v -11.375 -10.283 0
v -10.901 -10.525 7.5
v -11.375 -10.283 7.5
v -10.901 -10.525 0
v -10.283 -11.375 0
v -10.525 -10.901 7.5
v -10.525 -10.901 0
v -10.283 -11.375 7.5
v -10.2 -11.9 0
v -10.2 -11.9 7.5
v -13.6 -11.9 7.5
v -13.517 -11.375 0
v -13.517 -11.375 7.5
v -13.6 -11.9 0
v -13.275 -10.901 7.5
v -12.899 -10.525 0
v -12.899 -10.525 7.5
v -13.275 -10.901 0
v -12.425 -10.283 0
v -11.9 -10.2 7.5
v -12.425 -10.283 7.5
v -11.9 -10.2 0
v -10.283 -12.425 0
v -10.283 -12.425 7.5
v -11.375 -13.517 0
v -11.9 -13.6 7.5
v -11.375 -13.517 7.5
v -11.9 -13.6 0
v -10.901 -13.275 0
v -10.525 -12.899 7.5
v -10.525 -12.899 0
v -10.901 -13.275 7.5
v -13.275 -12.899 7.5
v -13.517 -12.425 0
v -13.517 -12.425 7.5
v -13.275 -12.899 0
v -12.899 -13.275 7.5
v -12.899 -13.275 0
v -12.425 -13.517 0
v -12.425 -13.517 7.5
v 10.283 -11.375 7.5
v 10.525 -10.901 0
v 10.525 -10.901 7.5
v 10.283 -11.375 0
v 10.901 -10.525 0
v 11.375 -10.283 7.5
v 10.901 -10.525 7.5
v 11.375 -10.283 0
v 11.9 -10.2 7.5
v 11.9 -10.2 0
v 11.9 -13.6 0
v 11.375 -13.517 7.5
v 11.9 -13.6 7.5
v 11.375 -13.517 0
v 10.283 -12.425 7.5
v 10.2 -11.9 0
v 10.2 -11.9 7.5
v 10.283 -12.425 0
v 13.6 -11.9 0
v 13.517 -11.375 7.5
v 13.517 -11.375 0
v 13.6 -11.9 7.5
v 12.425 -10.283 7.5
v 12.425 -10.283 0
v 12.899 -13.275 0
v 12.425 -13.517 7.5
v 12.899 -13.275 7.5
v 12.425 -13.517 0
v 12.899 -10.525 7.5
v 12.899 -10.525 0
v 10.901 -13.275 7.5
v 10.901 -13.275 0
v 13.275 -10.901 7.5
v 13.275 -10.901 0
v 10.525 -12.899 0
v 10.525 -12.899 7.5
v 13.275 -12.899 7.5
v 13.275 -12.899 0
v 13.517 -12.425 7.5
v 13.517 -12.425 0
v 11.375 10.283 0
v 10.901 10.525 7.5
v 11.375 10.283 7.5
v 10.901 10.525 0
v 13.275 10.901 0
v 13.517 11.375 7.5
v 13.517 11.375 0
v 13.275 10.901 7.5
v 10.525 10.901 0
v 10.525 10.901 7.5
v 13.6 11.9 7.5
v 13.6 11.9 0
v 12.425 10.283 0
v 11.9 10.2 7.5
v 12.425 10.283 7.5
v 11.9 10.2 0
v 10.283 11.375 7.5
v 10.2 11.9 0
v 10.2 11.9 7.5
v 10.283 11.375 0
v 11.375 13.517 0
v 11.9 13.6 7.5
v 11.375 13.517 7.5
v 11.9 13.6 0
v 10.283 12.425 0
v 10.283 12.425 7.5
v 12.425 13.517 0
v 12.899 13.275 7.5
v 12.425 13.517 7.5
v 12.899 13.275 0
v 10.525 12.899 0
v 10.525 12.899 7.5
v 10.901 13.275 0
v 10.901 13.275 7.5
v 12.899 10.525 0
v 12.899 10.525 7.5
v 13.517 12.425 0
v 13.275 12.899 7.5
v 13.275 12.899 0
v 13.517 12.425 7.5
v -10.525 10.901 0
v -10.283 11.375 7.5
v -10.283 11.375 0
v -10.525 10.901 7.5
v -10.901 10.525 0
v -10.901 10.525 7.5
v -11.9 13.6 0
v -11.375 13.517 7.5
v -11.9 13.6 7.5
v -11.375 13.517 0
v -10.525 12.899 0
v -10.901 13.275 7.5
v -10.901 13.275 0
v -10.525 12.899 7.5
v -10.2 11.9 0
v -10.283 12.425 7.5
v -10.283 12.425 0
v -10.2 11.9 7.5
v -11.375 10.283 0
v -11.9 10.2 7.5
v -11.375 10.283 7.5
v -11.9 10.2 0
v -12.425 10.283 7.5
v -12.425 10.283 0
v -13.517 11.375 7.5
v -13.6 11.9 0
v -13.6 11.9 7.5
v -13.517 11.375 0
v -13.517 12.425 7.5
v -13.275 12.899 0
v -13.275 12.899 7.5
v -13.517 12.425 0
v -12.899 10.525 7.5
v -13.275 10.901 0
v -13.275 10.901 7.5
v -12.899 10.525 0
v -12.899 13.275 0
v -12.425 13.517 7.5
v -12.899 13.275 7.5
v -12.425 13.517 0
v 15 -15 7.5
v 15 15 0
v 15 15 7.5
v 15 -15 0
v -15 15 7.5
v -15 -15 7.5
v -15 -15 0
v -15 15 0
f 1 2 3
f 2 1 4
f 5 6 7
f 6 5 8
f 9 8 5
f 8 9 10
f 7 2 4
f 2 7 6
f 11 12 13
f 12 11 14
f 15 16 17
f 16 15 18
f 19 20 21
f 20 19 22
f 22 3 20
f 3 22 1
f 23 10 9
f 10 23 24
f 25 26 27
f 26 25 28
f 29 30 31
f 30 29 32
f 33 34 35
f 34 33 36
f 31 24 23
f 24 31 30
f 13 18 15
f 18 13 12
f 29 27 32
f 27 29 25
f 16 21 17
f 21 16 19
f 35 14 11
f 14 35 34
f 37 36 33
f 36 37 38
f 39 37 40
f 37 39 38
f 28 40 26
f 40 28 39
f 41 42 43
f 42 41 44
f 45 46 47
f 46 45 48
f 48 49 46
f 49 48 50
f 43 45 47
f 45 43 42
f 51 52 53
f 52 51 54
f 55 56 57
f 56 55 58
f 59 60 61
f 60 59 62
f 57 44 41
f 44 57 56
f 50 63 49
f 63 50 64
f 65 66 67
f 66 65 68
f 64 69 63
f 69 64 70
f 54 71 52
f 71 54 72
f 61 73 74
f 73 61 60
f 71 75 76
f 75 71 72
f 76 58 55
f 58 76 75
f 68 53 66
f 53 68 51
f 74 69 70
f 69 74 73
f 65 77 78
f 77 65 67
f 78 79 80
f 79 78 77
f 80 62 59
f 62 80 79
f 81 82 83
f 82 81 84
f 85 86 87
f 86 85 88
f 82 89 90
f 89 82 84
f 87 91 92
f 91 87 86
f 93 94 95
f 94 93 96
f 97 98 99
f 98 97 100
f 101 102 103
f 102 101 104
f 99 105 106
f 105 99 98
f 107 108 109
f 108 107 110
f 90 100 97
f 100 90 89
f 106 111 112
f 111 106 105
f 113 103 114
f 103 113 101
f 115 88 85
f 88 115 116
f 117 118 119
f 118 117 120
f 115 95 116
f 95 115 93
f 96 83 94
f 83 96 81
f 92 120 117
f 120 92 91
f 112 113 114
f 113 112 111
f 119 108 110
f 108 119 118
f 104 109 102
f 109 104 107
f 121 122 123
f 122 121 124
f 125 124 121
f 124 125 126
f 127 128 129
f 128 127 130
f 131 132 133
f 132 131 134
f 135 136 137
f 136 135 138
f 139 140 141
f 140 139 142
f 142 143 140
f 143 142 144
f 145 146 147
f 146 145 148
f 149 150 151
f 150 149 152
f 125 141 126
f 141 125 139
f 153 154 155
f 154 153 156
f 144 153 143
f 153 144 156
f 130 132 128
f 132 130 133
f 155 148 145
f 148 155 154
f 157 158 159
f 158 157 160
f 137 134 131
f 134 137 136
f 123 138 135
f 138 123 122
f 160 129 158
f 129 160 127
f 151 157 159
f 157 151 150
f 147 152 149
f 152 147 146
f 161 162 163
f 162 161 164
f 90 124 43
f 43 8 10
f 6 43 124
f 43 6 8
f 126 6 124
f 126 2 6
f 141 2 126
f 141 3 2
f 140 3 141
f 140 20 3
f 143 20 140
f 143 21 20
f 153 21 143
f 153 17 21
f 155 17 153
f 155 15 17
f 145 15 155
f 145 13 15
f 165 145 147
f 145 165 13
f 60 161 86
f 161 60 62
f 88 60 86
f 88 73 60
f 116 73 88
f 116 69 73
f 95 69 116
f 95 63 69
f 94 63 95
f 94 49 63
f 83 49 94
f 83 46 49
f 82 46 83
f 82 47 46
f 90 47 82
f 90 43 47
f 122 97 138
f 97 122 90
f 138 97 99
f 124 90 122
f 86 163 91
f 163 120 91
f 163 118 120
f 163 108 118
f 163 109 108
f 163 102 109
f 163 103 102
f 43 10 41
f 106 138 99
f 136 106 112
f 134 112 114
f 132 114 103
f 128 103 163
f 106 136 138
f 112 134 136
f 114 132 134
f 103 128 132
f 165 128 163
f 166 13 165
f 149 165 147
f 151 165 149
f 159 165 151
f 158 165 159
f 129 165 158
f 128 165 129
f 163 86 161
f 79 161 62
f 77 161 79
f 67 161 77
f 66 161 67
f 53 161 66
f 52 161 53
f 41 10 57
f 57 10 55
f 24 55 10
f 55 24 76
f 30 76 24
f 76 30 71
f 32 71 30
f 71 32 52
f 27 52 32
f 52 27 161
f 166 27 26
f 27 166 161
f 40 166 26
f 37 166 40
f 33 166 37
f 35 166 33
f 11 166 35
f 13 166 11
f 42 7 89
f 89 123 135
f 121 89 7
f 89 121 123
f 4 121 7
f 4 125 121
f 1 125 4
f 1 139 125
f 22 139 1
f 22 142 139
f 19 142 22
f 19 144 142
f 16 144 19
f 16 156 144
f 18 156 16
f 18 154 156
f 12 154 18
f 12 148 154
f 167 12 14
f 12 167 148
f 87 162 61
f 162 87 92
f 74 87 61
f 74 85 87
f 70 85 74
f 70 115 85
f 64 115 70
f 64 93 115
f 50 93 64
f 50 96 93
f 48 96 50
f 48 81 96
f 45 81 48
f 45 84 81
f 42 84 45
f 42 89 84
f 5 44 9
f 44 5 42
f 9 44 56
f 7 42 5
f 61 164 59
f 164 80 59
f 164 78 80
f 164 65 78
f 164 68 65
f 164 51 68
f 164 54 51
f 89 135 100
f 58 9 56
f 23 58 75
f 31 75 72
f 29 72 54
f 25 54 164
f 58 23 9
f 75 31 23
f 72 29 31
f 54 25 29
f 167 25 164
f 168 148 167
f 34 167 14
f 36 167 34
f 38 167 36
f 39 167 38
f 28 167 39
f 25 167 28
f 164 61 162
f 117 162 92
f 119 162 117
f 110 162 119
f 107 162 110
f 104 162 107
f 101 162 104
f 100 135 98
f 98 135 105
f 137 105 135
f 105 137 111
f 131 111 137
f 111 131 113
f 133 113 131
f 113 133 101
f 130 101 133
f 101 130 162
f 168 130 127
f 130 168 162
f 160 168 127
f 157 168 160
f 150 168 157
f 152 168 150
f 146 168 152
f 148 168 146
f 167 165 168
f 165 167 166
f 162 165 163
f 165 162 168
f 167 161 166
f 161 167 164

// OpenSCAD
module PiFanBoreHoles() {
    for (i = [0, 90, 180, 270])
        rotate([0, 0, i])
        translate([-23.8/2, -23.8/2, 0])
            children();
};


module PiFan() {
    
    color("grey") {

        difference() {

            translate([-30/2, -30/2, 0])
            cube([30, 30, 7.5]);

            PiFanBoreHoles()
            translate([0, 0, -1])
            cylinder($fn=20, d = 3.4, h = 20);
        }
        
    }
    
};


PiFan();
